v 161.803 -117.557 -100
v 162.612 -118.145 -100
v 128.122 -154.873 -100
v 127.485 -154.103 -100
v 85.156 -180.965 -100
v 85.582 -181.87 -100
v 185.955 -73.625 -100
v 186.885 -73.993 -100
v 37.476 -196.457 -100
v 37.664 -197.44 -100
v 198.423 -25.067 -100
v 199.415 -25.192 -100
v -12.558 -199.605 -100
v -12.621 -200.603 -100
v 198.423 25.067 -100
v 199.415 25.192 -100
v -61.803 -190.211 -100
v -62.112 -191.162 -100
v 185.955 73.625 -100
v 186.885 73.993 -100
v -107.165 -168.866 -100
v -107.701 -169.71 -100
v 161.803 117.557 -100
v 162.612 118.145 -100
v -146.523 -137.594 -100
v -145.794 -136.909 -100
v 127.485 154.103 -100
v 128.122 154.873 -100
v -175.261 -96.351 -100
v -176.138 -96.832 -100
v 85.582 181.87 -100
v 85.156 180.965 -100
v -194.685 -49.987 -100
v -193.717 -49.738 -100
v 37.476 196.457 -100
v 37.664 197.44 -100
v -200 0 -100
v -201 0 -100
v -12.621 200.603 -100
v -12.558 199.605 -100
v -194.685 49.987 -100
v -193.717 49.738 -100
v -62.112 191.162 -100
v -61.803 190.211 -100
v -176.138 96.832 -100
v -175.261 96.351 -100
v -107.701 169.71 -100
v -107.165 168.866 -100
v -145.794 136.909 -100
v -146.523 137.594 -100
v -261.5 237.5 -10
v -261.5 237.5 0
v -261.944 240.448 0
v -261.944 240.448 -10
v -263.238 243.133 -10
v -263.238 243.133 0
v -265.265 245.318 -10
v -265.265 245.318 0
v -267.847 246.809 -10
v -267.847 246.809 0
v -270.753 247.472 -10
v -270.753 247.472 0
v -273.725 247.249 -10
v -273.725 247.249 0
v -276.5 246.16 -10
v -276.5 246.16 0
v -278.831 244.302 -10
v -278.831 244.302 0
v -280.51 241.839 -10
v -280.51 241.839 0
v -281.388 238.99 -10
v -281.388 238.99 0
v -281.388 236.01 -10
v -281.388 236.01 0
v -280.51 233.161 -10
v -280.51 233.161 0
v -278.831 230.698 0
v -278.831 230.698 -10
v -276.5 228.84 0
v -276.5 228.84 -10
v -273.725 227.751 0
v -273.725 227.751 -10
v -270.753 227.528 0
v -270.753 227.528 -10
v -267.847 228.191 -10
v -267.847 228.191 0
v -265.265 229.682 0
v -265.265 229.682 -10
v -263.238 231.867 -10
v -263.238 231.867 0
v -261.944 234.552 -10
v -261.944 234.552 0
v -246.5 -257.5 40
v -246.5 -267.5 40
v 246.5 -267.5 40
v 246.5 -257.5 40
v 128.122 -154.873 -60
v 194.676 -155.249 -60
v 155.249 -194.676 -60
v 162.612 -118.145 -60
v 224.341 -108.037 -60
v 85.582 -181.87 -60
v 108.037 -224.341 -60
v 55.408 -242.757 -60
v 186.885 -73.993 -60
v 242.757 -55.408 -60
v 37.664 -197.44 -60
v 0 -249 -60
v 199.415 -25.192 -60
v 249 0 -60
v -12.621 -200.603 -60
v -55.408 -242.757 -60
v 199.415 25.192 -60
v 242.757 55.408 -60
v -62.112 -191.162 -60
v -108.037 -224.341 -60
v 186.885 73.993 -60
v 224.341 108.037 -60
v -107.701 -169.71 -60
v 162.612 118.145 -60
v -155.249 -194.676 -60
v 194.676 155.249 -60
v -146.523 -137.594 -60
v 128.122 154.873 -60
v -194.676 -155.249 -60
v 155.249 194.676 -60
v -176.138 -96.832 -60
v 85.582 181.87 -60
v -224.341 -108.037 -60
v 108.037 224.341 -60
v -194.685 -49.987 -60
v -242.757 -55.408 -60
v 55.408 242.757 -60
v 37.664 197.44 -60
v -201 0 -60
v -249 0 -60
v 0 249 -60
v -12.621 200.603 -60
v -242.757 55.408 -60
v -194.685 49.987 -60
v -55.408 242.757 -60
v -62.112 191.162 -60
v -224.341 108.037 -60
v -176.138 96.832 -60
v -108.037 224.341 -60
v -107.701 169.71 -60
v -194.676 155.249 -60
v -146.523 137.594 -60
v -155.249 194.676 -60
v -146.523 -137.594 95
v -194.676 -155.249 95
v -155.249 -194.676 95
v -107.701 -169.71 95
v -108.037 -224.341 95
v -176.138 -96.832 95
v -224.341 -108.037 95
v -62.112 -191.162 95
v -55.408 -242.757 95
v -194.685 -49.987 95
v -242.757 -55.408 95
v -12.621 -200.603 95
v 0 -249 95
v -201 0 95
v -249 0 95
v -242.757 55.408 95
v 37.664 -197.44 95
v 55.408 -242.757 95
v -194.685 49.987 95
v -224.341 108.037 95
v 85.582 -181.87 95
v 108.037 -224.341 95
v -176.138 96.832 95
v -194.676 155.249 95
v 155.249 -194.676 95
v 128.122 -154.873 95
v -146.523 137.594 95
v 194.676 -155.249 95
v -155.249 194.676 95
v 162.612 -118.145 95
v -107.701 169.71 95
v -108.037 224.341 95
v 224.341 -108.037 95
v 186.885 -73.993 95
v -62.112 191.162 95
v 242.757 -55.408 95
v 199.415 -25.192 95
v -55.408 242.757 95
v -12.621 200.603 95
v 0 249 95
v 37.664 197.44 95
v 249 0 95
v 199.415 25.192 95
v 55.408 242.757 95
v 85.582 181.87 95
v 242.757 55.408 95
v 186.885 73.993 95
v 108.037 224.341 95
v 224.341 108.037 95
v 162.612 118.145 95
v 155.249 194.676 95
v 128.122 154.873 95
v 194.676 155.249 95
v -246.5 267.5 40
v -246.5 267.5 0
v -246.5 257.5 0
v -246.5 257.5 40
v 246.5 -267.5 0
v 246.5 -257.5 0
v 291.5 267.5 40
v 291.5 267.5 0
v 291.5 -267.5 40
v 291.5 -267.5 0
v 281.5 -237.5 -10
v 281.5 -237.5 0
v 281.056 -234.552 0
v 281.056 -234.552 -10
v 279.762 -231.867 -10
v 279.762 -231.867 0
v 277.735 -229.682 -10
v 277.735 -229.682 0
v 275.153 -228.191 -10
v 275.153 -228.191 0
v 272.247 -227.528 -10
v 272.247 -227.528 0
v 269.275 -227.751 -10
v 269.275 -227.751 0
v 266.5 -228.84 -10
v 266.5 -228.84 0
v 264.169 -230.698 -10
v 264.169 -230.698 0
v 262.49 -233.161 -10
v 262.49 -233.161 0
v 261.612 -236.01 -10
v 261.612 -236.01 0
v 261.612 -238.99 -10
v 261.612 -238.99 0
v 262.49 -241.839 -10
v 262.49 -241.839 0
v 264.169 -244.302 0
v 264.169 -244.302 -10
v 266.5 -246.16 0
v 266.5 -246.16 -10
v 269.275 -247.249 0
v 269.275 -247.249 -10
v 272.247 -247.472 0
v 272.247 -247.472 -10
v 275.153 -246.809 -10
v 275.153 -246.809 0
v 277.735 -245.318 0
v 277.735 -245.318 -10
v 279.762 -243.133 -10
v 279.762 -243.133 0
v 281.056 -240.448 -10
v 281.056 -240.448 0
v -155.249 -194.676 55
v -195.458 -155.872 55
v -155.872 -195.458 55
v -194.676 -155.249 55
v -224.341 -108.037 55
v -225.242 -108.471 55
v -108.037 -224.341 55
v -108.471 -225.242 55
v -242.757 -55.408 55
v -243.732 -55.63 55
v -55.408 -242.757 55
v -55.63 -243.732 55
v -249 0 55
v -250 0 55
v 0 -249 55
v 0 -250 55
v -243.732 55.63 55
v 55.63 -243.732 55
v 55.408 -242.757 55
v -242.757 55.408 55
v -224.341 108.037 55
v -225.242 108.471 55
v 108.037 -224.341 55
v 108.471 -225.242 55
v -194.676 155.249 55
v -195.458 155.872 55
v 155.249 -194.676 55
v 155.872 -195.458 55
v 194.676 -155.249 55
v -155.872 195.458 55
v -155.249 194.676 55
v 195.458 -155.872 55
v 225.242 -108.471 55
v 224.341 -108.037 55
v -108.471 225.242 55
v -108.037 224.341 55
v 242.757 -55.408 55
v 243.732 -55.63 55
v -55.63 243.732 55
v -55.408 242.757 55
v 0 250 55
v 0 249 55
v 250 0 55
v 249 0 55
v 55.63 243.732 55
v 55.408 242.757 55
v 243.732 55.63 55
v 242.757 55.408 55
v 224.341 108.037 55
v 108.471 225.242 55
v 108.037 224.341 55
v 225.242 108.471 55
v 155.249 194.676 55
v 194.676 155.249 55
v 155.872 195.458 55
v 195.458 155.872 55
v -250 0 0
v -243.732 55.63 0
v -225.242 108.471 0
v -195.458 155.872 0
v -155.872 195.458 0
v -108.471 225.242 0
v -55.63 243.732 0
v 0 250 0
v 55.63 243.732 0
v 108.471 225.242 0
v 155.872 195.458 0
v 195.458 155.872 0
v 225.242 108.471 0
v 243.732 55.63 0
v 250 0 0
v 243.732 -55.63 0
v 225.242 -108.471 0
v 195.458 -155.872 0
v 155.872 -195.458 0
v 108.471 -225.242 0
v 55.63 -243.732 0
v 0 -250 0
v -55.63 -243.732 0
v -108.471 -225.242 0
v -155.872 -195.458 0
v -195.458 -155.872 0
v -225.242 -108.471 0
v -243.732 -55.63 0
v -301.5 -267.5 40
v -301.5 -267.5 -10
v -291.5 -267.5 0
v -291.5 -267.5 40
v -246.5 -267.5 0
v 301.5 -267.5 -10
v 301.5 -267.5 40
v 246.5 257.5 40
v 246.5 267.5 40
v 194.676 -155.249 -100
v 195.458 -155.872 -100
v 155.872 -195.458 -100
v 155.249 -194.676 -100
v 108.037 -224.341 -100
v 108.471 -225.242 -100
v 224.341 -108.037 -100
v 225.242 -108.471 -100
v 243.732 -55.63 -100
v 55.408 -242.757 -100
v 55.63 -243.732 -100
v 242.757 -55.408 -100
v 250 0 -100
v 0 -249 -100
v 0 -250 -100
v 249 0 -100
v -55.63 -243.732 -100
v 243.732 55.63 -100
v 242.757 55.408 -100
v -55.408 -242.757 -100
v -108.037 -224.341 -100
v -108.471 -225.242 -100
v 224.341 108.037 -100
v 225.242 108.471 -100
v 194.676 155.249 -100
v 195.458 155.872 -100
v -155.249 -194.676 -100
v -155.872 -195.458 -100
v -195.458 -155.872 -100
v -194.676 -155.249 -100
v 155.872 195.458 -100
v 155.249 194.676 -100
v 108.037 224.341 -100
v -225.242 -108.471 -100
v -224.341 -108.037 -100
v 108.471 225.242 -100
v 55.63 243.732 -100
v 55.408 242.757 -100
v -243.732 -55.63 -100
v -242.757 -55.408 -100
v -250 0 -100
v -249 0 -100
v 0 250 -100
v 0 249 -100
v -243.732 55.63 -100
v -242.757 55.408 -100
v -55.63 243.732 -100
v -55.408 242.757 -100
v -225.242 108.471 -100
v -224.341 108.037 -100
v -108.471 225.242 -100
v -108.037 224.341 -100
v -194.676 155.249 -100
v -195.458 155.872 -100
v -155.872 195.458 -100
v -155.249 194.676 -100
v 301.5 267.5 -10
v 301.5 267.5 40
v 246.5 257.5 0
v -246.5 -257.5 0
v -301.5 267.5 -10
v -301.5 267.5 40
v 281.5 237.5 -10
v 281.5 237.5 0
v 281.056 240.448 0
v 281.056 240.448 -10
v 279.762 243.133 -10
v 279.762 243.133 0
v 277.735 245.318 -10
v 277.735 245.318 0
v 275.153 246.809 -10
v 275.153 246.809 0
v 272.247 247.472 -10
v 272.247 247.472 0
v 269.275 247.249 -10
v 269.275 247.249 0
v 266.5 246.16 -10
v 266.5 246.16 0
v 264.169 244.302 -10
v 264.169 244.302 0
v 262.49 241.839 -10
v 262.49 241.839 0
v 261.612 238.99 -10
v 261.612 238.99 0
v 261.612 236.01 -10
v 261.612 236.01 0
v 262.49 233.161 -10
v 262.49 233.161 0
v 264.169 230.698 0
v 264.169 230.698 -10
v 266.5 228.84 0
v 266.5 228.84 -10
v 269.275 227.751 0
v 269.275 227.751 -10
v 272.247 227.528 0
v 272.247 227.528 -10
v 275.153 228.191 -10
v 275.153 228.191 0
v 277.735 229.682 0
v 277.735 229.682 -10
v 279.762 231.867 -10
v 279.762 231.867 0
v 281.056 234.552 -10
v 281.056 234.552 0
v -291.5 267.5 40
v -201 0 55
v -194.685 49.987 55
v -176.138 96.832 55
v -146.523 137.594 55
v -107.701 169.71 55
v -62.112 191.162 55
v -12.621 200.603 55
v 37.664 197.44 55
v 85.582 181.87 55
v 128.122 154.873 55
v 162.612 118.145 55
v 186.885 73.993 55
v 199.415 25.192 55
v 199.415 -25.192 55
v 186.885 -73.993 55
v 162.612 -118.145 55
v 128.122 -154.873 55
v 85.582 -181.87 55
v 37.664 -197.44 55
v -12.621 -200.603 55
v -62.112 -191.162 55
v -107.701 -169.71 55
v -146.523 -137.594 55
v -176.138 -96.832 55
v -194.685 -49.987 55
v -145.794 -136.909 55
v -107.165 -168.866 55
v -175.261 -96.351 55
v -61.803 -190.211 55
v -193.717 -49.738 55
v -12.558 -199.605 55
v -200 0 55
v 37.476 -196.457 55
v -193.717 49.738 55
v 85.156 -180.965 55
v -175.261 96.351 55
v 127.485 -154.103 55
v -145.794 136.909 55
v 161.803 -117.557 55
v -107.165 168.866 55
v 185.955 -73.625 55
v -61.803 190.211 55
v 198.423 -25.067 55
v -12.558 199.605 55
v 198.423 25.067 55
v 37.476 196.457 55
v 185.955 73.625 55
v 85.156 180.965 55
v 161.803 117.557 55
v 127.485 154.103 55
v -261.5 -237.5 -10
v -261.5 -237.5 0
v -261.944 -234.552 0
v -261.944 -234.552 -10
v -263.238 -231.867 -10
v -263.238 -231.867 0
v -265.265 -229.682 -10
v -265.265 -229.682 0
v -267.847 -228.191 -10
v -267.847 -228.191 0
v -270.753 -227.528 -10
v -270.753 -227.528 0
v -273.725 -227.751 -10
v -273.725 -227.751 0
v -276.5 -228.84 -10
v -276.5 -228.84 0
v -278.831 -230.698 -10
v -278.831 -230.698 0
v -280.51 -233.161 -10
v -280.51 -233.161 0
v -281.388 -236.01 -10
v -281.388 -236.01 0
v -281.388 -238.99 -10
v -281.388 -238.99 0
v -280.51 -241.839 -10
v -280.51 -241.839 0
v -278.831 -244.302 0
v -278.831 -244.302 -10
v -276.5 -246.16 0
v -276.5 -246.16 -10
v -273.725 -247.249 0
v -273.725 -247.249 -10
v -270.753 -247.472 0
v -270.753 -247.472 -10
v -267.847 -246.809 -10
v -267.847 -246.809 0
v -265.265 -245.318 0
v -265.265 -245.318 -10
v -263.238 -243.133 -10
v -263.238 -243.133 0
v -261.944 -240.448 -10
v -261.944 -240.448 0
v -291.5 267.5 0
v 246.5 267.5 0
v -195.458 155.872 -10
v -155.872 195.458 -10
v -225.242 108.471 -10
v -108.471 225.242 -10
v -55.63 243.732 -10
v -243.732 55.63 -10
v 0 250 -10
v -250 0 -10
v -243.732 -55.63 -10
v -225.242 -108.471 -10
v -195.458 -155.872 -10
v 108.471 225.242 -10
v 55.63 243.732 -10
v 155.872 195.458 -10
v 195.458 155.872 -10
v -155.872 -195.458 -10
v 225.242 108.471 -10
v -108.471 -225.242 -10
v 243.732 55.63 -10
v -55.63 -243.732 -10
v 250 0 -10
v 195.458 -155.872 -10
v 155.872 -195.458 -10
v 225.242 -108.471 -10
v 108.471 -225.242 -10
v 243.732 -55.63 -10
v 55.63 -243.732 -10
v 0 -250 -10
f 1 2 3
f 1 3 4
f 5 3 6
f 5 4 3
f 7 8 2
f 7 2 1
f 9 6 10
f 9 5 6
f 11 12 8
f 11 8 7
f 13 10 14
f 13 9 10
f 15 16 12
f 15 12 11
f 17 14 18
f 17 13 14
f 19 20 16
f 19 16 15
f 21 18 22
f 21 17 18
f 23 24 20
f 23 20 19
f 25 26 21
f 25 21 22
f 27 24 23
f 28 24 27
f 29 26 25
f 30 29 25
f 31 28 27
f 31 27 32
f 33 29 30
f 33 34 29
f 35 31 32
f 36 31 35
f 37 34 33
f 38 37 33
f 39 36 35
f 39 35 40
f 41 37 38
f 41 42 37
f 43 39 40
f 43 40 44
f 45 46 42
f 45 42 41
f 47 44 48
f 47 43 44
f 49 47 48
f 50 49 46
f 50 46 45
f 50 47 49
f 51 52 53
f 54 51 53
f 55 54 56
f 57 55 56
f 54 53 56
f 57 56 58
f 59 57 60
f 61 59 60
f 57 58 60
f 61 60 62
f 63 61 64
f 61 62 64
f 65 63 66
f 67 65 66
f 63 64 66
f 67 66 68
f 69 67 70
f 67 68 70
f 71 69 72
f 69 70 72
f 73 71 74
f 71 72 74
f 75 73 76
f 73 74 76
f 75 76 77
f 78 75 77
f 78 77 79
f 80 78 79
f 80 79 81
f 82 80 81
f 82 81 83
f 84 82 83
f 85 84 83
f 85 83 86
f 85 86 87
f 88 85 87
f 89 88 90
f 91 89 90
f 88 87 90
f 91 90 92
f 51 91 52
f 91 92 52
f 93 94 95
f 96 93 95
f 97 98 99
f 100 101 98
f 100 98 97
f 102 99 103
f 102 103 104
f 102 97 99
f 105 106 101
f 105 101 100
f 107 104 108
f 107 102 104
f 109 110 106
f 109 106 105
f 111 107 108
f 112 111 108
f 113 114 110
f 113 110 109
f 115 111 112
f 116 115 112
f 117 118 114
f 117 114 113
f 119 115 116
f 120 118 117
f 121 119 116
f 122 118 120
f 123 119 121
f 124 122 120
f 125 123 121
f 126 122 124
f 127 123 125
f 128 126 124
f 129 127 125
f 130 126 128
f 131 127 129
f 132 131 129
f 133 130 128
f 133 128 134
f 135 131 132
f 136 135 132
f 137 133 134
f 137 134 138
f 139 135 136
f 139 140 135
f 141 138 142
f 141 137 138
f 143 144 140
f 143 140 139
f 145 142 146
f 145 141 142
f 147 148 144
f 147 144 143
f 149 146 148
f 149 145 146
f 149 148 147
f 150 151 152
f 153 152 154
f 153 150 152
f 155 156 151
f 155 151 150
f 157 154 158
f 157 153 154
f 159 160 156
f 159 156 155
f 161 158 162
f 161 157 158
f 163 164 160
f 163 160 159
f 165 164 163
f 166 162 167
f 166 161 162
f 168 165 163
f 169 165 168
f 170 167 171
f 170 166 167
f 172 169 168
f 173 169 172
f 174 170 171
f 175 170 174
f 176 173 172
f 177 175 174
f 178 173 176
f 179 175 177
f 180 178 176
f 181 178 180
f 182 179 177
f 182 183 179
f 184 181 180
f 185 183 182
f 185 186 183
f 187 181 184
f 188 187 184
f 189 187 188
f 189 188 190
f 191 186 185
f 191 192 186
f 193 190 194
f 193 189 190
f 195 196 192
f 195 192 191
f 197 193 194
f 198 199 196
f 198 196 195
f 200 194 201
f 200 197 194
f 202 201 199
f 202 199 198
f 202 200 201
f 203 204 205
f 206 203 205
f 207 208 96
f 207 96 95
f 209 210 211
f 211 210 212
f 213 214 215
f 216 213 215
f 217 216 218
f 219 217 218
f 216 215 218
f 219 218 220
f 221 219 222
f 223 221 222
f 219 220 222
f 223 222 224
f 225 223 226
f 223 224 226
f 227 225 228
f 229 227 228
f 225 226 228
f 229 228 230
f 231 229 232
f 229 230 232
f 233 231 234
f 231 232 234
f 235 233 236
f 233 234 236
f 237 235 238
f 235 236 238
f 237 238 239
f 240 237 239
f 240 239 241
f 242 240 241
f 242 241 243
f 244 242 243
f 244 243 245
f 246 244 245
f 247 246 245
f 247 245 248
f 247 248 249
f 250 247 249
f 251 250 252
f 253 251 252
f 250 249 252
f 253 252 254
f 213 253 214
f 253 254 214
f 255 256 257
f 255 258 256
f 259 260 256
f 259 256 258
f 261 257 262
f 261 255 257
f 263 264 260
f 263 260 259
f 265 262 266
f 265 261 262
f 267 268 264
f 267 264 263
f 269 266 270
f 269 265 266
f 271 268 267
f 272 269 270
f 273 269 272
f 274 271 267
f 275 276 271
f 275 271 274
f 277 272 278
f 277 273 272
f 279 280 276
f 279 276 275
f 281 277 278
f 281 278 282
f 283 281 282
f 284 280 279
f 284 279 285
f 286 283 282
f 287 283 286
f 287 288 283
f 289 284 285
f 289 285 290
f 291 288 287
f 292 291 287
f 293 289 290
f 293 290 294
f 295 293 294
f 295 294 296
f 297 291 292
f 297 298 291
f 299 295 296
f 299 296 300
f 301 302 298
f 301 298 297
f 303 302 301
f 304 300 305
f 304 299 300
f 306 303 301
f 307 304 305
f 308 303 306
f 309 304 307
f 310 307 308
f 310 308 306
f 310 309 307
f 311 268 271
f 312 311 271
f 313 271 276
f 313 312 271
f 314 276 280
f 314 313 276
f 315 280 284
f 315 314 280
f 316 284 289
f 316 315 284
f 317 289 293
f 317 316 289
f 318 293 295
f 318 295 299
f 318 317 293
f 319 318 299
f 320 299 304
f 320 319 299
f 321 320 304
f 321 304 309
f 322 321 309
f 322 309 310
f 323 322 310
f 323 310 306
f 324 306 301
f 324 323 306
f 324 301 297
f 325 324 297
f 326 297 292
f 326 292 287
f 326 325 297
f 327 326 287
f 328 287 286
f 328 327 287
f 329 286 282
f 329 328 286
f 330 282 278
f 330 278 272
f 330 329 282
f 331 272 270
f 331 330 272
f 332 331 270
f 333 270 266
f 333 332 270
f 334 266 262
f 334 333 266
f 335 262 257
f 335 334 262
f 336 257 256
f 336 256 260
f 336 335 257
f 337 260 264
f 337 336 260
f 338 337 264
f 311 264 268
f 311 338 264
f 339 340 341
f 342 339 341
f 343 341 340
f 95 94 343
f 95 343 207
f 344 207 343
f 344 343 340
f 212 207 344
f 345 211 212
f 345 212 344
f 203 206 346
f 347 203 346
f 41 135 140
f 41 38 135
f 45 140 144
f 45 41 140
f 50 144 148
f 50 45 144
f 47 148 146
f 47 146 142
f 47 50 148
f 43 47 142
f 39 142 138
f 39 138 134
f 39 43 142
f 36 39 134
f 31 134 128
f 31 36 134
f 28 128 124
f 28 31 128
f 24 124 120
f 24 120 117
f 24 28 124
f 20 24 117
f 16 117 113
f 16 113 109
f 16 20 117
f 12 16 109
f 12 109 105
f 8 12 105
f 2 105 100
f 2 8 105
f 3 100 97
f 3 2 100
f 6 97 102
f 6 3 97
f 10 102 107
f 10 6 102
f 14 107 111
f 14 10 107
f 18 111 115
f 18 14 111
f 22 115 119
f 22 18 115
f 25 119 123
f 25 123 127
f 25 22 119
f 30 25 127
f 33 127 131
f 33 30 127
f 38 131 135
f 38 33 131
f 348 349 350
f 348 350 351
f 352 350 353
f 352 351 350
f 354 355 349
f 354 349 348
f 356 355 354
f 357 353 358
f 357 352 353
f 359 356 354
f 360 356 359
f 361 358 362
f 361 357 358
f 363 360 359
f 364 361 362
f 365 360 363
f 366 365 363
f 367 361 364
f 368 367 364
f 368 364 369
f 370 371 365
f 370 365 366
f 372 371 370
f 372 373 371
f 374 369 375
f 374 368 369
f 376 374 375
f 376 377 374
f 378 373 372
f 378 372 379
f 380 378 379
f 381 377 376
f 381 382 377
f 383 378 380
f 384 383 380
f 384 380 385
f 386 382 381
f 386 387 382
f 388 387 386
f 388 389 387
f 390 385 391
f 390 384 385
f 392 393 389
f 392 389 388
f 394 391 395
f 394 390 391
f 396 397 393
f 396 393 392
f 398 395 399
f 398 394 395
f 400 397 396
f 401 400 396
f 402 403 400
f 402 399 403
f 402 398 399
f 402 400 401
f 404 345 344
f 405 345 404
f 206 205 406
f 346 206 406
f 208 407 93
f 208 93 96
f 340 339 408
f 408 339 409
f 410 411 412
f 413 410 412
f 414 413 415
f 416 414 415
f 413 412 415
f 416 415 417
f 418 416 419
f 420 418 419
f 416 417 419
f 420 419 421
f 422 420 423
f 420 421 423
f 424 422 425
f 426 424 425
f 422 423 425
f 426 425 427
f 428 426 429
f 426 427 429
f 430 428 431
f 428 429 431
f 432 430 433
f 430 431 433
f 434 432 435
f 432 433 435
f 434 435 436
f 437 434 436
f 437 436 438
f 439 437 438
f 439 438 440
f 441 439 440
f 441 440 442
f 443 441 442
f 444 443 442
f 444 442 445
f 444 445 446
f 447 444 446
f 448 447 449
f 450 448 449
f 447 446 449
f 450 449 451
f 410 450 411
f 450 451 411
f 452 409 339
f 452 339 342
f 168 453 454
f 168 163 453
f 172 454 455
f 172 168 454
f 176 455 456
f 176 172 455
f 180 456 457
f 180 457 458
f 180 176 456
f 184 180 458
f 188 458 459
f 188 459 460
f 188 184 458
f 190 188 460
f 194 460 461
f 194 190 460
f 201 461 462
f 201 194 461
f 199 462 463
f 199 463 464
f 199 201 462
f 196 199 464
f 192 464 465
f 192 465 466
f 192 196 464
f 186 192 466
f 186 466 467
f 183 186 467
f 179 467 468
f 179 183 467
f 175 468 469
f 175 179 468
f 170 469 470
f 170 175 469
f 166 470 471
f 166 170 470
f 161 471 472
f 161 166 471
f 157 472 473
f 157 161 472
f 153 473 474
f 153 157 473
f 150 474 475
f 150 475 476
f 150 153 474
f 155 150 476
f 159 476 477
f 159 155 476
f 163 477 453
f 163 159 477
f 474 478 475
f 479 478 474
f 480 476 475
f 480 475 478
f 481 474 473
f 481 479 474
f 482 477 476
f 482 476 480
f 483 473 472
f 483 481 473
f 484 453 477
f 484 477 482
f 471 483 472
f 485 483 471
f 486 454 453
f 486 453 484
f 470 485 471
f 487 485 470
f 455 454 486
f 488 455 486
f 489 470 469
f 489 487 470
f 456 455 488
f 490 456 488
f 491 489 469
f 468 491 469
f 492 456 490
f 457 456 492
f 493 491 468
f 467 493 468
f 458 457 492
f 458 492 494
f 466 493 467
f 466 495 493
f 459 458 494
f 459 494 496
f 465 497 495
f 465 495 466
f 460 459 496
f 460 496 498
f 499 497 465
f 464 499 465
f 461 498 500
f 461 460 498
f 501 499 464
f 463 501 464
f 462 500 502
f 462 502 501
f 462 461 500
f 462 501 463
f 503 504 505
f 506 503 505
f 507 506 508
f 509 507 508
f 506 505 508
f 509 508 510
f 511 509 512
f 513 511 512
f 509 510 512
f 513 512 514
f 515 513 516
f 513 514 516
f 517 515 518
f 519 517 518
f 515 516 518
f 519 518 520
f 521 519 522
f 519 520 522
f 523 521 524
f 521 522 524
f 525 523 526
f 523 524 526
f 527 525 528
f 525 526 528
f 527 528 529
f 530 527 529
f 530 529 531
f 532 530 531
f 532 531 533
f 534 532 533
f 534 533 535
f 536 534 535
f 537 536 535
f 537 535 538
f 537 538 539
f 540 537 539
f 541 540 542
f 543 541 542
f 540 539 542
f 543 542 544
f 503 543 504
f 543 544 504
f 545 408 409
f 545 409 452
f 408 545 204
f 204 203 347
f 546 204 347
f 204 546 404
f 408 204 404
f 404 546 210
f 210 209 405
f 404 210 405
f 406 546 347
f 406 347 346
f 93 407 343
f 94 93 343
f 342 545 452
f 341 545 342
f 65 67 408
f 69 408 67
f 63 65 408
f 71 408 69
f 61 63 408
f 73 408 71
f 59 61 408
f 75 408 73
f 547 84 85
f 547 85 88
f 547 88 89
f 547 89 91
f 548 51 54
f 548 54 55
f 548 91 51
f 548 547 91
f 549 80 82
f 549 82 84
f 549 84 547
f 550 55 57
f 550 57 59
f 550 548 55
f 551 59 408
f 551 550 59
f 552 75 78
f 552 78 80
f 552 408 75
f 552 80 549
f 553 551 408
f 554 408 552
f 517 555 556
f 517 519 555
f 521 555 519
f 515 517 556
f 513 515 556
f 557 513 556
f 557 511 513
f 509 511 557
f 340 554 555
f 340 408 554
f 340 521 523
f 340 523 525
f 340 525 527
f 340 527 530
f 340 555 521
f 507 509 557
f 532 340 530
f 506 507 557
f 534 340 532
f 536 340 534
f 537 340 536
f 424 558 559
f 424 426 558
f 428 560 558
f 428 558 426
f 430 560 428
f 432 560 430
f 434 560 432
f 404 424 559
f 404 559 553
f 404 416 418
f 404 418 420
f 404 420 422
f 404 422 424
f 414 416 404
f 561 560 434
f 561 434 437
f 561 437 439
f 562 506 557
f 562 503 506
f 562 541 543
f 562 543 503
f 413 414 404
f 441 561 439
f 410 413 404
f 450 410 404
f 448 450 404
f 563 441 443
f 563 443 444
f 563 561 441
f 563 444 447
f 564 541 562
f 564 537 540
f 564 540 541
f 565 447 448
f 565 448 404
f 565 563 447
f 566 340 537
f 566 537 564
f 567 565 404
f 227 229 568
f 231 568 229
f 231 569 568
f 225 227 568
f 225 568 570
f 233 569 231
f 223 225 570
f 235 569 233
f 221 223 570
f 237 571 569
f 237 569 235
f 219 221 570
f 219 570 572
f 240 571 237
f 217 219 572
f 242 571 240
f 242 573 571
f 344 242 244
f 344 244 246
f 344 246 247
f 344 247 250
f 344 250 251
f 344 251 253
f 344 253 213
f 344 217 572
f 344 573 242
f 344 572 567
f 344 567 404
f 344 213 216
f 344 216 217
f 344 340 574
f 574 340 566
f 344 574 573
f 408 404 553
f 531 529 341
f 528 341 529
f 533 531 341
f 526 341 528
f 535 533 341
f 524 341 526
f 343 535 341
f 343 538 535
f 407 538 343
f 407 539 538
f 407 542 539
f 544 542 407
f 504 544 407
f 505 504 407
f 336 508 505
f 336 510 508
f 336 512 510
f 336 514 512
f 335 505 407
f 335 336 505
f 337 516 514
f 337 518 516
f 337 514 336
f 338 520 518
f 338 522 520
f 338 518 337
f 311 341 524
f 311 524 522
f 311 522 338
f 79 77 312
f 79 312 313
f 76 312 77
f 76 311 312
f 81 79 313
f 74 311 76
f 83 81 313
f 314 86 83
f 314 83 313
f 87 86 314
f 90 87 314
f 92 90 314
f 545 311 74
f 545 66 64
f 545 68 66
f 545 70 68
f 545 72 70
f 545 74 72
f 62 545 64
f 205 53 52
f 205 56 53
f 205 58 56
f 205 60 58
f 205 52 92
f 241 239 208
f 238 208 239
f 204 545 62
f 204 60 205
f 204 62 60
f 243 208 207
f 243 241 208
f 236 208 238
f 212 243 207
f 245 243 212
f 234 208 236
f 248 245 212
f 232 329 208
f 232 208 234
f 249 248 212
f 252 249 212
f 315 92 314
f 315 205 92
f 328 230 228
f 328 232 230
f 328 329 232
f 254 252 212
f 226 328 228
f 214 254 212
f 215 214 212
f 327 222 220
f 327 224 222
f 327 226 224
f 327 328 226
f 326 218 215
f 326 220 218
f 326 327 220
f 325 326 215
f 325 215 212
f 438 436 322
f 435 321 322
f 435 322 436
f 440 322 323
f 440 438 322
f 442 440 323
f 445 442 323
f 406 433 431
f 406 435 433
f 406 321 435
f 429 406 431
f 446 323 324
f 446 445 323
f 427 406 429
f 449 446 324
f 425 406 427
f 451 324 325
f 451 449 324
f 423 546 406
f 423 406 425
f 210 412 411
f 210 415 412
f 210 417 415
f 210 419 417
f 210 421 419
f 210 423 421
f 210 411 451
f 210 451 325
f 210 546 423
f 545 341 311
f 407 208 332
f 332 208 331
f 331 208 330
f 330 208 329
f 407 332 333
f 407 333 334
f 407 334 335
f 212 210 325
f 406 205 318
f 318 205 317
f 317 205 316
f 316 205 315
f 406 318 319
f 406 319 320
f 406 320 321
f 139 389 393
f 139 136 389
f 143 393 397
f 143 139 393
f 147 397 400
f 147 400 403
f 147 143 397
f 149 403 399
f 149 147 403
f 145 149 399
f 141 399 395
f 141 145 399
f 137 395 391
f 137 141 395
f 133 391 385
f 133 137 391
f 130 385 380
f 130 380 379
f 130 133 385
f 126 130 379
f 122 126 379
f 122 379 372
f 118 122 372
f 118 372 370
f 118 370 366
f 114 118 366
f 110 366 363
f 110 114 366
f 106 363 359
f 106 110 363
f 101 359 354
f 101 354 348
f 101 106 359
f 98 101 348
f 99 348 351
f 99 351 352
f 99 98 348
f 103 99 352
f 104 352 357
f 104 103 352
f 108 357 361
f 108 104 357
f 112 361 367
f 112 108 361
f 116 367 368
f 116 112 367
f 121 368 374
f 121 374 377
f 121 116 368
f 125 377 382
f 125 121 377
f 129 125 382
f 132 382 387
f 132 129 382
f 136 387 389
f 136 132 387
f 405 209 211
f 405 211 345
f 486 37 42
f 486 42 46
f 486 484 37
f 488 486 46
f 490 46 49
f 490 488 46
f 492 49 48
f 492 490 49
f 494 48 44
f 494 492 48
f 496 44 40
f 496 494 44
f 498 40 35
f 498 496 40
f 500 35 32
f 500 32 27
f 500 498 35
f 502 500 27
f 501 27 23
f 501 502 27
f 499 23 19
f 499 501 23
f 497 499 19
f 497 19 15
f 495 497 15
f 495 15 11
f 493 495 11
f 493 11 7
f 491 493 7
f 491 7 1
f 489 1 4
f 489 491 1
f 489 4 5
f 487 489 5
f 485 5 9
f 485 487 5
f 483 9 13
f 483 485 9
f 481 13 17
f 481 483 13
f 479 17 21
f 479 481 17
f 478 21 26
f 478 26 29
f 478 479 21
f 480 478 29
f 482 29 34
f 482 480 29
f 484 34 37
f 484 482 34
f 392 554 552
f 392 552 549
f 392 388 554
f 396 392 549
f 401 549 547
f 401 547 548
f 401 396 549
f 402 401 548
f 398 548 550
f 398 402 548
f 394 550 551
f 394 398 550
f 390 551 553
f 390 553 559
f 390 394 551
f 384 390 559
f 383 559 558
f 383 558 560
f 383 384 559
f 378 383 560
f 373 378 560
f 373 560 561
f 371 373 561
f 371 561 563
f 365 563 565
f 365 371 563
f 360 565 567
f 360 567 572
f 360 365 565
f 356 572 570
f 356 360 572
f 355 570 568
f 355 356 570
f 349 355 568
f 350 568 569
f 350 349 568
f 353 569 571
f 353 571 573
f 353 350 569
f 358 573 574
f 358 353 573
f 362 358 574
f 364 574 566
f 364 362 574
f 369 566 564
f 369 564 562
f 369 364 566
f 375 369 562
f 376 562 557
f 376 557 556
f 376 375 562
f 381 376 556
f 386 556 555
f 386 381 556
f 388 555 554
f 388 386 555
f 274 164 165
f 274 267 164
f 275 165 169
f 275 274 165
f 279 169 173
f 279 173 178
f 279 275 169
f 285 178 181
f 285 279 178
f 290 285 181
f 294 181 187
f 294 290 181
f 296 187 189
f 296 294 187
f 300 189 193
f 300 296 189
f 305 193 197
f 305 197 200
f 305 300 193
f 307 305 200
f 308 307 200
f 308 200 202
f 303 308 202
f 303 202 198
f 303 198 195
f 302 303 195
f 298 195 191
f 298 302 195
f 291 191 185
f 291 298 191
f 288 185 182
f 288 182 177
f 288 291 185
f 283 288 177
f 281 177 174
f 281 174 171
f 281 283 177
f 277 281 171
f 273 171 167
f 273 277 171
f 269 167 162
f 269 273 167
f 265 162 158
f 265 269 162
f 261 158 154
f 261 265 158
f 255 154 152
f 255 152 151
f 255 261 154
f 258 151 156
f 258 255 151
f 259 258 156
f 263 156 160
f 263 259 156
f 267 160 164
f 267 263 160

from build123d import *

# Parameters (mm, degrees)
F2_W     = 603
F2_H     = 535
F2_R     = 10
F2_R_2   = 201
F3_DEPTH = 10
F4_W     = 493
F4_H     = 10
F4_W_2   = 10
F4_H_2   = 535
F5_DEPTH = 50


with BuildPart() as f1:
    # F0 (on Front) → F1 (revolve)
    with BuildSketch(Plane.XZ):
        Polygon((-201, -100), (-200, -100), (-200, 55), (-201, 55), (-201, 95), (-249, 95), (-249, 55), (-250, 55), (-250, -100), (-249, -100), (-249, -60), (-201, -60), align=None)
    revolve(axis=Axis((0, 0, -77.049306), (0, 0, -1)))

    # F2 (on Top) → F3 (join)
    with BuildSketch(Plane.XY):
        Rectangle(F2_W, F2_H)
        with Locations((-271.5, -237.5)):
            Circle(F2_R, mode=Mode.SUBTRACT)
        with Locations((271.5, -237.5)):
            Circle(F2_R, mode=Mode.SUBTRACT)
        with Locations((-271.5, 237.5)):
            Circle(F2_R, mode=Mode.SUBTRACT)
        Circle(F2_R_2, mode=Mode.SUBTRACT)
        with Locations((271.5, 237.5)):
            Circle(F2_R, mode=Mode.SUBTRACT)
    extrude(amount=-F3_DEPTH)

    # F4 (on face) → F5 (join)
    with BuildSketch(Plane(origin=(0, 0, -10), x_dir=(1, 0, 0), z_dir=(0, 0, -1))):
        with Locations((0, 262.5)):
            Rectangle(F4_W, F4_H)
        with Locations((-296.5, 0)):
            Rectangle(F4_W_2, F4_H_2)
        with Locations((0, -262.5)):
            Rectangle(F4_W, F4_H)
        with Locations((296.5, 0)):
            Rectangle(F4_W_2, F4_H_2)
    extrude(amount=-F5_DEPTH)


solid = f1.part
